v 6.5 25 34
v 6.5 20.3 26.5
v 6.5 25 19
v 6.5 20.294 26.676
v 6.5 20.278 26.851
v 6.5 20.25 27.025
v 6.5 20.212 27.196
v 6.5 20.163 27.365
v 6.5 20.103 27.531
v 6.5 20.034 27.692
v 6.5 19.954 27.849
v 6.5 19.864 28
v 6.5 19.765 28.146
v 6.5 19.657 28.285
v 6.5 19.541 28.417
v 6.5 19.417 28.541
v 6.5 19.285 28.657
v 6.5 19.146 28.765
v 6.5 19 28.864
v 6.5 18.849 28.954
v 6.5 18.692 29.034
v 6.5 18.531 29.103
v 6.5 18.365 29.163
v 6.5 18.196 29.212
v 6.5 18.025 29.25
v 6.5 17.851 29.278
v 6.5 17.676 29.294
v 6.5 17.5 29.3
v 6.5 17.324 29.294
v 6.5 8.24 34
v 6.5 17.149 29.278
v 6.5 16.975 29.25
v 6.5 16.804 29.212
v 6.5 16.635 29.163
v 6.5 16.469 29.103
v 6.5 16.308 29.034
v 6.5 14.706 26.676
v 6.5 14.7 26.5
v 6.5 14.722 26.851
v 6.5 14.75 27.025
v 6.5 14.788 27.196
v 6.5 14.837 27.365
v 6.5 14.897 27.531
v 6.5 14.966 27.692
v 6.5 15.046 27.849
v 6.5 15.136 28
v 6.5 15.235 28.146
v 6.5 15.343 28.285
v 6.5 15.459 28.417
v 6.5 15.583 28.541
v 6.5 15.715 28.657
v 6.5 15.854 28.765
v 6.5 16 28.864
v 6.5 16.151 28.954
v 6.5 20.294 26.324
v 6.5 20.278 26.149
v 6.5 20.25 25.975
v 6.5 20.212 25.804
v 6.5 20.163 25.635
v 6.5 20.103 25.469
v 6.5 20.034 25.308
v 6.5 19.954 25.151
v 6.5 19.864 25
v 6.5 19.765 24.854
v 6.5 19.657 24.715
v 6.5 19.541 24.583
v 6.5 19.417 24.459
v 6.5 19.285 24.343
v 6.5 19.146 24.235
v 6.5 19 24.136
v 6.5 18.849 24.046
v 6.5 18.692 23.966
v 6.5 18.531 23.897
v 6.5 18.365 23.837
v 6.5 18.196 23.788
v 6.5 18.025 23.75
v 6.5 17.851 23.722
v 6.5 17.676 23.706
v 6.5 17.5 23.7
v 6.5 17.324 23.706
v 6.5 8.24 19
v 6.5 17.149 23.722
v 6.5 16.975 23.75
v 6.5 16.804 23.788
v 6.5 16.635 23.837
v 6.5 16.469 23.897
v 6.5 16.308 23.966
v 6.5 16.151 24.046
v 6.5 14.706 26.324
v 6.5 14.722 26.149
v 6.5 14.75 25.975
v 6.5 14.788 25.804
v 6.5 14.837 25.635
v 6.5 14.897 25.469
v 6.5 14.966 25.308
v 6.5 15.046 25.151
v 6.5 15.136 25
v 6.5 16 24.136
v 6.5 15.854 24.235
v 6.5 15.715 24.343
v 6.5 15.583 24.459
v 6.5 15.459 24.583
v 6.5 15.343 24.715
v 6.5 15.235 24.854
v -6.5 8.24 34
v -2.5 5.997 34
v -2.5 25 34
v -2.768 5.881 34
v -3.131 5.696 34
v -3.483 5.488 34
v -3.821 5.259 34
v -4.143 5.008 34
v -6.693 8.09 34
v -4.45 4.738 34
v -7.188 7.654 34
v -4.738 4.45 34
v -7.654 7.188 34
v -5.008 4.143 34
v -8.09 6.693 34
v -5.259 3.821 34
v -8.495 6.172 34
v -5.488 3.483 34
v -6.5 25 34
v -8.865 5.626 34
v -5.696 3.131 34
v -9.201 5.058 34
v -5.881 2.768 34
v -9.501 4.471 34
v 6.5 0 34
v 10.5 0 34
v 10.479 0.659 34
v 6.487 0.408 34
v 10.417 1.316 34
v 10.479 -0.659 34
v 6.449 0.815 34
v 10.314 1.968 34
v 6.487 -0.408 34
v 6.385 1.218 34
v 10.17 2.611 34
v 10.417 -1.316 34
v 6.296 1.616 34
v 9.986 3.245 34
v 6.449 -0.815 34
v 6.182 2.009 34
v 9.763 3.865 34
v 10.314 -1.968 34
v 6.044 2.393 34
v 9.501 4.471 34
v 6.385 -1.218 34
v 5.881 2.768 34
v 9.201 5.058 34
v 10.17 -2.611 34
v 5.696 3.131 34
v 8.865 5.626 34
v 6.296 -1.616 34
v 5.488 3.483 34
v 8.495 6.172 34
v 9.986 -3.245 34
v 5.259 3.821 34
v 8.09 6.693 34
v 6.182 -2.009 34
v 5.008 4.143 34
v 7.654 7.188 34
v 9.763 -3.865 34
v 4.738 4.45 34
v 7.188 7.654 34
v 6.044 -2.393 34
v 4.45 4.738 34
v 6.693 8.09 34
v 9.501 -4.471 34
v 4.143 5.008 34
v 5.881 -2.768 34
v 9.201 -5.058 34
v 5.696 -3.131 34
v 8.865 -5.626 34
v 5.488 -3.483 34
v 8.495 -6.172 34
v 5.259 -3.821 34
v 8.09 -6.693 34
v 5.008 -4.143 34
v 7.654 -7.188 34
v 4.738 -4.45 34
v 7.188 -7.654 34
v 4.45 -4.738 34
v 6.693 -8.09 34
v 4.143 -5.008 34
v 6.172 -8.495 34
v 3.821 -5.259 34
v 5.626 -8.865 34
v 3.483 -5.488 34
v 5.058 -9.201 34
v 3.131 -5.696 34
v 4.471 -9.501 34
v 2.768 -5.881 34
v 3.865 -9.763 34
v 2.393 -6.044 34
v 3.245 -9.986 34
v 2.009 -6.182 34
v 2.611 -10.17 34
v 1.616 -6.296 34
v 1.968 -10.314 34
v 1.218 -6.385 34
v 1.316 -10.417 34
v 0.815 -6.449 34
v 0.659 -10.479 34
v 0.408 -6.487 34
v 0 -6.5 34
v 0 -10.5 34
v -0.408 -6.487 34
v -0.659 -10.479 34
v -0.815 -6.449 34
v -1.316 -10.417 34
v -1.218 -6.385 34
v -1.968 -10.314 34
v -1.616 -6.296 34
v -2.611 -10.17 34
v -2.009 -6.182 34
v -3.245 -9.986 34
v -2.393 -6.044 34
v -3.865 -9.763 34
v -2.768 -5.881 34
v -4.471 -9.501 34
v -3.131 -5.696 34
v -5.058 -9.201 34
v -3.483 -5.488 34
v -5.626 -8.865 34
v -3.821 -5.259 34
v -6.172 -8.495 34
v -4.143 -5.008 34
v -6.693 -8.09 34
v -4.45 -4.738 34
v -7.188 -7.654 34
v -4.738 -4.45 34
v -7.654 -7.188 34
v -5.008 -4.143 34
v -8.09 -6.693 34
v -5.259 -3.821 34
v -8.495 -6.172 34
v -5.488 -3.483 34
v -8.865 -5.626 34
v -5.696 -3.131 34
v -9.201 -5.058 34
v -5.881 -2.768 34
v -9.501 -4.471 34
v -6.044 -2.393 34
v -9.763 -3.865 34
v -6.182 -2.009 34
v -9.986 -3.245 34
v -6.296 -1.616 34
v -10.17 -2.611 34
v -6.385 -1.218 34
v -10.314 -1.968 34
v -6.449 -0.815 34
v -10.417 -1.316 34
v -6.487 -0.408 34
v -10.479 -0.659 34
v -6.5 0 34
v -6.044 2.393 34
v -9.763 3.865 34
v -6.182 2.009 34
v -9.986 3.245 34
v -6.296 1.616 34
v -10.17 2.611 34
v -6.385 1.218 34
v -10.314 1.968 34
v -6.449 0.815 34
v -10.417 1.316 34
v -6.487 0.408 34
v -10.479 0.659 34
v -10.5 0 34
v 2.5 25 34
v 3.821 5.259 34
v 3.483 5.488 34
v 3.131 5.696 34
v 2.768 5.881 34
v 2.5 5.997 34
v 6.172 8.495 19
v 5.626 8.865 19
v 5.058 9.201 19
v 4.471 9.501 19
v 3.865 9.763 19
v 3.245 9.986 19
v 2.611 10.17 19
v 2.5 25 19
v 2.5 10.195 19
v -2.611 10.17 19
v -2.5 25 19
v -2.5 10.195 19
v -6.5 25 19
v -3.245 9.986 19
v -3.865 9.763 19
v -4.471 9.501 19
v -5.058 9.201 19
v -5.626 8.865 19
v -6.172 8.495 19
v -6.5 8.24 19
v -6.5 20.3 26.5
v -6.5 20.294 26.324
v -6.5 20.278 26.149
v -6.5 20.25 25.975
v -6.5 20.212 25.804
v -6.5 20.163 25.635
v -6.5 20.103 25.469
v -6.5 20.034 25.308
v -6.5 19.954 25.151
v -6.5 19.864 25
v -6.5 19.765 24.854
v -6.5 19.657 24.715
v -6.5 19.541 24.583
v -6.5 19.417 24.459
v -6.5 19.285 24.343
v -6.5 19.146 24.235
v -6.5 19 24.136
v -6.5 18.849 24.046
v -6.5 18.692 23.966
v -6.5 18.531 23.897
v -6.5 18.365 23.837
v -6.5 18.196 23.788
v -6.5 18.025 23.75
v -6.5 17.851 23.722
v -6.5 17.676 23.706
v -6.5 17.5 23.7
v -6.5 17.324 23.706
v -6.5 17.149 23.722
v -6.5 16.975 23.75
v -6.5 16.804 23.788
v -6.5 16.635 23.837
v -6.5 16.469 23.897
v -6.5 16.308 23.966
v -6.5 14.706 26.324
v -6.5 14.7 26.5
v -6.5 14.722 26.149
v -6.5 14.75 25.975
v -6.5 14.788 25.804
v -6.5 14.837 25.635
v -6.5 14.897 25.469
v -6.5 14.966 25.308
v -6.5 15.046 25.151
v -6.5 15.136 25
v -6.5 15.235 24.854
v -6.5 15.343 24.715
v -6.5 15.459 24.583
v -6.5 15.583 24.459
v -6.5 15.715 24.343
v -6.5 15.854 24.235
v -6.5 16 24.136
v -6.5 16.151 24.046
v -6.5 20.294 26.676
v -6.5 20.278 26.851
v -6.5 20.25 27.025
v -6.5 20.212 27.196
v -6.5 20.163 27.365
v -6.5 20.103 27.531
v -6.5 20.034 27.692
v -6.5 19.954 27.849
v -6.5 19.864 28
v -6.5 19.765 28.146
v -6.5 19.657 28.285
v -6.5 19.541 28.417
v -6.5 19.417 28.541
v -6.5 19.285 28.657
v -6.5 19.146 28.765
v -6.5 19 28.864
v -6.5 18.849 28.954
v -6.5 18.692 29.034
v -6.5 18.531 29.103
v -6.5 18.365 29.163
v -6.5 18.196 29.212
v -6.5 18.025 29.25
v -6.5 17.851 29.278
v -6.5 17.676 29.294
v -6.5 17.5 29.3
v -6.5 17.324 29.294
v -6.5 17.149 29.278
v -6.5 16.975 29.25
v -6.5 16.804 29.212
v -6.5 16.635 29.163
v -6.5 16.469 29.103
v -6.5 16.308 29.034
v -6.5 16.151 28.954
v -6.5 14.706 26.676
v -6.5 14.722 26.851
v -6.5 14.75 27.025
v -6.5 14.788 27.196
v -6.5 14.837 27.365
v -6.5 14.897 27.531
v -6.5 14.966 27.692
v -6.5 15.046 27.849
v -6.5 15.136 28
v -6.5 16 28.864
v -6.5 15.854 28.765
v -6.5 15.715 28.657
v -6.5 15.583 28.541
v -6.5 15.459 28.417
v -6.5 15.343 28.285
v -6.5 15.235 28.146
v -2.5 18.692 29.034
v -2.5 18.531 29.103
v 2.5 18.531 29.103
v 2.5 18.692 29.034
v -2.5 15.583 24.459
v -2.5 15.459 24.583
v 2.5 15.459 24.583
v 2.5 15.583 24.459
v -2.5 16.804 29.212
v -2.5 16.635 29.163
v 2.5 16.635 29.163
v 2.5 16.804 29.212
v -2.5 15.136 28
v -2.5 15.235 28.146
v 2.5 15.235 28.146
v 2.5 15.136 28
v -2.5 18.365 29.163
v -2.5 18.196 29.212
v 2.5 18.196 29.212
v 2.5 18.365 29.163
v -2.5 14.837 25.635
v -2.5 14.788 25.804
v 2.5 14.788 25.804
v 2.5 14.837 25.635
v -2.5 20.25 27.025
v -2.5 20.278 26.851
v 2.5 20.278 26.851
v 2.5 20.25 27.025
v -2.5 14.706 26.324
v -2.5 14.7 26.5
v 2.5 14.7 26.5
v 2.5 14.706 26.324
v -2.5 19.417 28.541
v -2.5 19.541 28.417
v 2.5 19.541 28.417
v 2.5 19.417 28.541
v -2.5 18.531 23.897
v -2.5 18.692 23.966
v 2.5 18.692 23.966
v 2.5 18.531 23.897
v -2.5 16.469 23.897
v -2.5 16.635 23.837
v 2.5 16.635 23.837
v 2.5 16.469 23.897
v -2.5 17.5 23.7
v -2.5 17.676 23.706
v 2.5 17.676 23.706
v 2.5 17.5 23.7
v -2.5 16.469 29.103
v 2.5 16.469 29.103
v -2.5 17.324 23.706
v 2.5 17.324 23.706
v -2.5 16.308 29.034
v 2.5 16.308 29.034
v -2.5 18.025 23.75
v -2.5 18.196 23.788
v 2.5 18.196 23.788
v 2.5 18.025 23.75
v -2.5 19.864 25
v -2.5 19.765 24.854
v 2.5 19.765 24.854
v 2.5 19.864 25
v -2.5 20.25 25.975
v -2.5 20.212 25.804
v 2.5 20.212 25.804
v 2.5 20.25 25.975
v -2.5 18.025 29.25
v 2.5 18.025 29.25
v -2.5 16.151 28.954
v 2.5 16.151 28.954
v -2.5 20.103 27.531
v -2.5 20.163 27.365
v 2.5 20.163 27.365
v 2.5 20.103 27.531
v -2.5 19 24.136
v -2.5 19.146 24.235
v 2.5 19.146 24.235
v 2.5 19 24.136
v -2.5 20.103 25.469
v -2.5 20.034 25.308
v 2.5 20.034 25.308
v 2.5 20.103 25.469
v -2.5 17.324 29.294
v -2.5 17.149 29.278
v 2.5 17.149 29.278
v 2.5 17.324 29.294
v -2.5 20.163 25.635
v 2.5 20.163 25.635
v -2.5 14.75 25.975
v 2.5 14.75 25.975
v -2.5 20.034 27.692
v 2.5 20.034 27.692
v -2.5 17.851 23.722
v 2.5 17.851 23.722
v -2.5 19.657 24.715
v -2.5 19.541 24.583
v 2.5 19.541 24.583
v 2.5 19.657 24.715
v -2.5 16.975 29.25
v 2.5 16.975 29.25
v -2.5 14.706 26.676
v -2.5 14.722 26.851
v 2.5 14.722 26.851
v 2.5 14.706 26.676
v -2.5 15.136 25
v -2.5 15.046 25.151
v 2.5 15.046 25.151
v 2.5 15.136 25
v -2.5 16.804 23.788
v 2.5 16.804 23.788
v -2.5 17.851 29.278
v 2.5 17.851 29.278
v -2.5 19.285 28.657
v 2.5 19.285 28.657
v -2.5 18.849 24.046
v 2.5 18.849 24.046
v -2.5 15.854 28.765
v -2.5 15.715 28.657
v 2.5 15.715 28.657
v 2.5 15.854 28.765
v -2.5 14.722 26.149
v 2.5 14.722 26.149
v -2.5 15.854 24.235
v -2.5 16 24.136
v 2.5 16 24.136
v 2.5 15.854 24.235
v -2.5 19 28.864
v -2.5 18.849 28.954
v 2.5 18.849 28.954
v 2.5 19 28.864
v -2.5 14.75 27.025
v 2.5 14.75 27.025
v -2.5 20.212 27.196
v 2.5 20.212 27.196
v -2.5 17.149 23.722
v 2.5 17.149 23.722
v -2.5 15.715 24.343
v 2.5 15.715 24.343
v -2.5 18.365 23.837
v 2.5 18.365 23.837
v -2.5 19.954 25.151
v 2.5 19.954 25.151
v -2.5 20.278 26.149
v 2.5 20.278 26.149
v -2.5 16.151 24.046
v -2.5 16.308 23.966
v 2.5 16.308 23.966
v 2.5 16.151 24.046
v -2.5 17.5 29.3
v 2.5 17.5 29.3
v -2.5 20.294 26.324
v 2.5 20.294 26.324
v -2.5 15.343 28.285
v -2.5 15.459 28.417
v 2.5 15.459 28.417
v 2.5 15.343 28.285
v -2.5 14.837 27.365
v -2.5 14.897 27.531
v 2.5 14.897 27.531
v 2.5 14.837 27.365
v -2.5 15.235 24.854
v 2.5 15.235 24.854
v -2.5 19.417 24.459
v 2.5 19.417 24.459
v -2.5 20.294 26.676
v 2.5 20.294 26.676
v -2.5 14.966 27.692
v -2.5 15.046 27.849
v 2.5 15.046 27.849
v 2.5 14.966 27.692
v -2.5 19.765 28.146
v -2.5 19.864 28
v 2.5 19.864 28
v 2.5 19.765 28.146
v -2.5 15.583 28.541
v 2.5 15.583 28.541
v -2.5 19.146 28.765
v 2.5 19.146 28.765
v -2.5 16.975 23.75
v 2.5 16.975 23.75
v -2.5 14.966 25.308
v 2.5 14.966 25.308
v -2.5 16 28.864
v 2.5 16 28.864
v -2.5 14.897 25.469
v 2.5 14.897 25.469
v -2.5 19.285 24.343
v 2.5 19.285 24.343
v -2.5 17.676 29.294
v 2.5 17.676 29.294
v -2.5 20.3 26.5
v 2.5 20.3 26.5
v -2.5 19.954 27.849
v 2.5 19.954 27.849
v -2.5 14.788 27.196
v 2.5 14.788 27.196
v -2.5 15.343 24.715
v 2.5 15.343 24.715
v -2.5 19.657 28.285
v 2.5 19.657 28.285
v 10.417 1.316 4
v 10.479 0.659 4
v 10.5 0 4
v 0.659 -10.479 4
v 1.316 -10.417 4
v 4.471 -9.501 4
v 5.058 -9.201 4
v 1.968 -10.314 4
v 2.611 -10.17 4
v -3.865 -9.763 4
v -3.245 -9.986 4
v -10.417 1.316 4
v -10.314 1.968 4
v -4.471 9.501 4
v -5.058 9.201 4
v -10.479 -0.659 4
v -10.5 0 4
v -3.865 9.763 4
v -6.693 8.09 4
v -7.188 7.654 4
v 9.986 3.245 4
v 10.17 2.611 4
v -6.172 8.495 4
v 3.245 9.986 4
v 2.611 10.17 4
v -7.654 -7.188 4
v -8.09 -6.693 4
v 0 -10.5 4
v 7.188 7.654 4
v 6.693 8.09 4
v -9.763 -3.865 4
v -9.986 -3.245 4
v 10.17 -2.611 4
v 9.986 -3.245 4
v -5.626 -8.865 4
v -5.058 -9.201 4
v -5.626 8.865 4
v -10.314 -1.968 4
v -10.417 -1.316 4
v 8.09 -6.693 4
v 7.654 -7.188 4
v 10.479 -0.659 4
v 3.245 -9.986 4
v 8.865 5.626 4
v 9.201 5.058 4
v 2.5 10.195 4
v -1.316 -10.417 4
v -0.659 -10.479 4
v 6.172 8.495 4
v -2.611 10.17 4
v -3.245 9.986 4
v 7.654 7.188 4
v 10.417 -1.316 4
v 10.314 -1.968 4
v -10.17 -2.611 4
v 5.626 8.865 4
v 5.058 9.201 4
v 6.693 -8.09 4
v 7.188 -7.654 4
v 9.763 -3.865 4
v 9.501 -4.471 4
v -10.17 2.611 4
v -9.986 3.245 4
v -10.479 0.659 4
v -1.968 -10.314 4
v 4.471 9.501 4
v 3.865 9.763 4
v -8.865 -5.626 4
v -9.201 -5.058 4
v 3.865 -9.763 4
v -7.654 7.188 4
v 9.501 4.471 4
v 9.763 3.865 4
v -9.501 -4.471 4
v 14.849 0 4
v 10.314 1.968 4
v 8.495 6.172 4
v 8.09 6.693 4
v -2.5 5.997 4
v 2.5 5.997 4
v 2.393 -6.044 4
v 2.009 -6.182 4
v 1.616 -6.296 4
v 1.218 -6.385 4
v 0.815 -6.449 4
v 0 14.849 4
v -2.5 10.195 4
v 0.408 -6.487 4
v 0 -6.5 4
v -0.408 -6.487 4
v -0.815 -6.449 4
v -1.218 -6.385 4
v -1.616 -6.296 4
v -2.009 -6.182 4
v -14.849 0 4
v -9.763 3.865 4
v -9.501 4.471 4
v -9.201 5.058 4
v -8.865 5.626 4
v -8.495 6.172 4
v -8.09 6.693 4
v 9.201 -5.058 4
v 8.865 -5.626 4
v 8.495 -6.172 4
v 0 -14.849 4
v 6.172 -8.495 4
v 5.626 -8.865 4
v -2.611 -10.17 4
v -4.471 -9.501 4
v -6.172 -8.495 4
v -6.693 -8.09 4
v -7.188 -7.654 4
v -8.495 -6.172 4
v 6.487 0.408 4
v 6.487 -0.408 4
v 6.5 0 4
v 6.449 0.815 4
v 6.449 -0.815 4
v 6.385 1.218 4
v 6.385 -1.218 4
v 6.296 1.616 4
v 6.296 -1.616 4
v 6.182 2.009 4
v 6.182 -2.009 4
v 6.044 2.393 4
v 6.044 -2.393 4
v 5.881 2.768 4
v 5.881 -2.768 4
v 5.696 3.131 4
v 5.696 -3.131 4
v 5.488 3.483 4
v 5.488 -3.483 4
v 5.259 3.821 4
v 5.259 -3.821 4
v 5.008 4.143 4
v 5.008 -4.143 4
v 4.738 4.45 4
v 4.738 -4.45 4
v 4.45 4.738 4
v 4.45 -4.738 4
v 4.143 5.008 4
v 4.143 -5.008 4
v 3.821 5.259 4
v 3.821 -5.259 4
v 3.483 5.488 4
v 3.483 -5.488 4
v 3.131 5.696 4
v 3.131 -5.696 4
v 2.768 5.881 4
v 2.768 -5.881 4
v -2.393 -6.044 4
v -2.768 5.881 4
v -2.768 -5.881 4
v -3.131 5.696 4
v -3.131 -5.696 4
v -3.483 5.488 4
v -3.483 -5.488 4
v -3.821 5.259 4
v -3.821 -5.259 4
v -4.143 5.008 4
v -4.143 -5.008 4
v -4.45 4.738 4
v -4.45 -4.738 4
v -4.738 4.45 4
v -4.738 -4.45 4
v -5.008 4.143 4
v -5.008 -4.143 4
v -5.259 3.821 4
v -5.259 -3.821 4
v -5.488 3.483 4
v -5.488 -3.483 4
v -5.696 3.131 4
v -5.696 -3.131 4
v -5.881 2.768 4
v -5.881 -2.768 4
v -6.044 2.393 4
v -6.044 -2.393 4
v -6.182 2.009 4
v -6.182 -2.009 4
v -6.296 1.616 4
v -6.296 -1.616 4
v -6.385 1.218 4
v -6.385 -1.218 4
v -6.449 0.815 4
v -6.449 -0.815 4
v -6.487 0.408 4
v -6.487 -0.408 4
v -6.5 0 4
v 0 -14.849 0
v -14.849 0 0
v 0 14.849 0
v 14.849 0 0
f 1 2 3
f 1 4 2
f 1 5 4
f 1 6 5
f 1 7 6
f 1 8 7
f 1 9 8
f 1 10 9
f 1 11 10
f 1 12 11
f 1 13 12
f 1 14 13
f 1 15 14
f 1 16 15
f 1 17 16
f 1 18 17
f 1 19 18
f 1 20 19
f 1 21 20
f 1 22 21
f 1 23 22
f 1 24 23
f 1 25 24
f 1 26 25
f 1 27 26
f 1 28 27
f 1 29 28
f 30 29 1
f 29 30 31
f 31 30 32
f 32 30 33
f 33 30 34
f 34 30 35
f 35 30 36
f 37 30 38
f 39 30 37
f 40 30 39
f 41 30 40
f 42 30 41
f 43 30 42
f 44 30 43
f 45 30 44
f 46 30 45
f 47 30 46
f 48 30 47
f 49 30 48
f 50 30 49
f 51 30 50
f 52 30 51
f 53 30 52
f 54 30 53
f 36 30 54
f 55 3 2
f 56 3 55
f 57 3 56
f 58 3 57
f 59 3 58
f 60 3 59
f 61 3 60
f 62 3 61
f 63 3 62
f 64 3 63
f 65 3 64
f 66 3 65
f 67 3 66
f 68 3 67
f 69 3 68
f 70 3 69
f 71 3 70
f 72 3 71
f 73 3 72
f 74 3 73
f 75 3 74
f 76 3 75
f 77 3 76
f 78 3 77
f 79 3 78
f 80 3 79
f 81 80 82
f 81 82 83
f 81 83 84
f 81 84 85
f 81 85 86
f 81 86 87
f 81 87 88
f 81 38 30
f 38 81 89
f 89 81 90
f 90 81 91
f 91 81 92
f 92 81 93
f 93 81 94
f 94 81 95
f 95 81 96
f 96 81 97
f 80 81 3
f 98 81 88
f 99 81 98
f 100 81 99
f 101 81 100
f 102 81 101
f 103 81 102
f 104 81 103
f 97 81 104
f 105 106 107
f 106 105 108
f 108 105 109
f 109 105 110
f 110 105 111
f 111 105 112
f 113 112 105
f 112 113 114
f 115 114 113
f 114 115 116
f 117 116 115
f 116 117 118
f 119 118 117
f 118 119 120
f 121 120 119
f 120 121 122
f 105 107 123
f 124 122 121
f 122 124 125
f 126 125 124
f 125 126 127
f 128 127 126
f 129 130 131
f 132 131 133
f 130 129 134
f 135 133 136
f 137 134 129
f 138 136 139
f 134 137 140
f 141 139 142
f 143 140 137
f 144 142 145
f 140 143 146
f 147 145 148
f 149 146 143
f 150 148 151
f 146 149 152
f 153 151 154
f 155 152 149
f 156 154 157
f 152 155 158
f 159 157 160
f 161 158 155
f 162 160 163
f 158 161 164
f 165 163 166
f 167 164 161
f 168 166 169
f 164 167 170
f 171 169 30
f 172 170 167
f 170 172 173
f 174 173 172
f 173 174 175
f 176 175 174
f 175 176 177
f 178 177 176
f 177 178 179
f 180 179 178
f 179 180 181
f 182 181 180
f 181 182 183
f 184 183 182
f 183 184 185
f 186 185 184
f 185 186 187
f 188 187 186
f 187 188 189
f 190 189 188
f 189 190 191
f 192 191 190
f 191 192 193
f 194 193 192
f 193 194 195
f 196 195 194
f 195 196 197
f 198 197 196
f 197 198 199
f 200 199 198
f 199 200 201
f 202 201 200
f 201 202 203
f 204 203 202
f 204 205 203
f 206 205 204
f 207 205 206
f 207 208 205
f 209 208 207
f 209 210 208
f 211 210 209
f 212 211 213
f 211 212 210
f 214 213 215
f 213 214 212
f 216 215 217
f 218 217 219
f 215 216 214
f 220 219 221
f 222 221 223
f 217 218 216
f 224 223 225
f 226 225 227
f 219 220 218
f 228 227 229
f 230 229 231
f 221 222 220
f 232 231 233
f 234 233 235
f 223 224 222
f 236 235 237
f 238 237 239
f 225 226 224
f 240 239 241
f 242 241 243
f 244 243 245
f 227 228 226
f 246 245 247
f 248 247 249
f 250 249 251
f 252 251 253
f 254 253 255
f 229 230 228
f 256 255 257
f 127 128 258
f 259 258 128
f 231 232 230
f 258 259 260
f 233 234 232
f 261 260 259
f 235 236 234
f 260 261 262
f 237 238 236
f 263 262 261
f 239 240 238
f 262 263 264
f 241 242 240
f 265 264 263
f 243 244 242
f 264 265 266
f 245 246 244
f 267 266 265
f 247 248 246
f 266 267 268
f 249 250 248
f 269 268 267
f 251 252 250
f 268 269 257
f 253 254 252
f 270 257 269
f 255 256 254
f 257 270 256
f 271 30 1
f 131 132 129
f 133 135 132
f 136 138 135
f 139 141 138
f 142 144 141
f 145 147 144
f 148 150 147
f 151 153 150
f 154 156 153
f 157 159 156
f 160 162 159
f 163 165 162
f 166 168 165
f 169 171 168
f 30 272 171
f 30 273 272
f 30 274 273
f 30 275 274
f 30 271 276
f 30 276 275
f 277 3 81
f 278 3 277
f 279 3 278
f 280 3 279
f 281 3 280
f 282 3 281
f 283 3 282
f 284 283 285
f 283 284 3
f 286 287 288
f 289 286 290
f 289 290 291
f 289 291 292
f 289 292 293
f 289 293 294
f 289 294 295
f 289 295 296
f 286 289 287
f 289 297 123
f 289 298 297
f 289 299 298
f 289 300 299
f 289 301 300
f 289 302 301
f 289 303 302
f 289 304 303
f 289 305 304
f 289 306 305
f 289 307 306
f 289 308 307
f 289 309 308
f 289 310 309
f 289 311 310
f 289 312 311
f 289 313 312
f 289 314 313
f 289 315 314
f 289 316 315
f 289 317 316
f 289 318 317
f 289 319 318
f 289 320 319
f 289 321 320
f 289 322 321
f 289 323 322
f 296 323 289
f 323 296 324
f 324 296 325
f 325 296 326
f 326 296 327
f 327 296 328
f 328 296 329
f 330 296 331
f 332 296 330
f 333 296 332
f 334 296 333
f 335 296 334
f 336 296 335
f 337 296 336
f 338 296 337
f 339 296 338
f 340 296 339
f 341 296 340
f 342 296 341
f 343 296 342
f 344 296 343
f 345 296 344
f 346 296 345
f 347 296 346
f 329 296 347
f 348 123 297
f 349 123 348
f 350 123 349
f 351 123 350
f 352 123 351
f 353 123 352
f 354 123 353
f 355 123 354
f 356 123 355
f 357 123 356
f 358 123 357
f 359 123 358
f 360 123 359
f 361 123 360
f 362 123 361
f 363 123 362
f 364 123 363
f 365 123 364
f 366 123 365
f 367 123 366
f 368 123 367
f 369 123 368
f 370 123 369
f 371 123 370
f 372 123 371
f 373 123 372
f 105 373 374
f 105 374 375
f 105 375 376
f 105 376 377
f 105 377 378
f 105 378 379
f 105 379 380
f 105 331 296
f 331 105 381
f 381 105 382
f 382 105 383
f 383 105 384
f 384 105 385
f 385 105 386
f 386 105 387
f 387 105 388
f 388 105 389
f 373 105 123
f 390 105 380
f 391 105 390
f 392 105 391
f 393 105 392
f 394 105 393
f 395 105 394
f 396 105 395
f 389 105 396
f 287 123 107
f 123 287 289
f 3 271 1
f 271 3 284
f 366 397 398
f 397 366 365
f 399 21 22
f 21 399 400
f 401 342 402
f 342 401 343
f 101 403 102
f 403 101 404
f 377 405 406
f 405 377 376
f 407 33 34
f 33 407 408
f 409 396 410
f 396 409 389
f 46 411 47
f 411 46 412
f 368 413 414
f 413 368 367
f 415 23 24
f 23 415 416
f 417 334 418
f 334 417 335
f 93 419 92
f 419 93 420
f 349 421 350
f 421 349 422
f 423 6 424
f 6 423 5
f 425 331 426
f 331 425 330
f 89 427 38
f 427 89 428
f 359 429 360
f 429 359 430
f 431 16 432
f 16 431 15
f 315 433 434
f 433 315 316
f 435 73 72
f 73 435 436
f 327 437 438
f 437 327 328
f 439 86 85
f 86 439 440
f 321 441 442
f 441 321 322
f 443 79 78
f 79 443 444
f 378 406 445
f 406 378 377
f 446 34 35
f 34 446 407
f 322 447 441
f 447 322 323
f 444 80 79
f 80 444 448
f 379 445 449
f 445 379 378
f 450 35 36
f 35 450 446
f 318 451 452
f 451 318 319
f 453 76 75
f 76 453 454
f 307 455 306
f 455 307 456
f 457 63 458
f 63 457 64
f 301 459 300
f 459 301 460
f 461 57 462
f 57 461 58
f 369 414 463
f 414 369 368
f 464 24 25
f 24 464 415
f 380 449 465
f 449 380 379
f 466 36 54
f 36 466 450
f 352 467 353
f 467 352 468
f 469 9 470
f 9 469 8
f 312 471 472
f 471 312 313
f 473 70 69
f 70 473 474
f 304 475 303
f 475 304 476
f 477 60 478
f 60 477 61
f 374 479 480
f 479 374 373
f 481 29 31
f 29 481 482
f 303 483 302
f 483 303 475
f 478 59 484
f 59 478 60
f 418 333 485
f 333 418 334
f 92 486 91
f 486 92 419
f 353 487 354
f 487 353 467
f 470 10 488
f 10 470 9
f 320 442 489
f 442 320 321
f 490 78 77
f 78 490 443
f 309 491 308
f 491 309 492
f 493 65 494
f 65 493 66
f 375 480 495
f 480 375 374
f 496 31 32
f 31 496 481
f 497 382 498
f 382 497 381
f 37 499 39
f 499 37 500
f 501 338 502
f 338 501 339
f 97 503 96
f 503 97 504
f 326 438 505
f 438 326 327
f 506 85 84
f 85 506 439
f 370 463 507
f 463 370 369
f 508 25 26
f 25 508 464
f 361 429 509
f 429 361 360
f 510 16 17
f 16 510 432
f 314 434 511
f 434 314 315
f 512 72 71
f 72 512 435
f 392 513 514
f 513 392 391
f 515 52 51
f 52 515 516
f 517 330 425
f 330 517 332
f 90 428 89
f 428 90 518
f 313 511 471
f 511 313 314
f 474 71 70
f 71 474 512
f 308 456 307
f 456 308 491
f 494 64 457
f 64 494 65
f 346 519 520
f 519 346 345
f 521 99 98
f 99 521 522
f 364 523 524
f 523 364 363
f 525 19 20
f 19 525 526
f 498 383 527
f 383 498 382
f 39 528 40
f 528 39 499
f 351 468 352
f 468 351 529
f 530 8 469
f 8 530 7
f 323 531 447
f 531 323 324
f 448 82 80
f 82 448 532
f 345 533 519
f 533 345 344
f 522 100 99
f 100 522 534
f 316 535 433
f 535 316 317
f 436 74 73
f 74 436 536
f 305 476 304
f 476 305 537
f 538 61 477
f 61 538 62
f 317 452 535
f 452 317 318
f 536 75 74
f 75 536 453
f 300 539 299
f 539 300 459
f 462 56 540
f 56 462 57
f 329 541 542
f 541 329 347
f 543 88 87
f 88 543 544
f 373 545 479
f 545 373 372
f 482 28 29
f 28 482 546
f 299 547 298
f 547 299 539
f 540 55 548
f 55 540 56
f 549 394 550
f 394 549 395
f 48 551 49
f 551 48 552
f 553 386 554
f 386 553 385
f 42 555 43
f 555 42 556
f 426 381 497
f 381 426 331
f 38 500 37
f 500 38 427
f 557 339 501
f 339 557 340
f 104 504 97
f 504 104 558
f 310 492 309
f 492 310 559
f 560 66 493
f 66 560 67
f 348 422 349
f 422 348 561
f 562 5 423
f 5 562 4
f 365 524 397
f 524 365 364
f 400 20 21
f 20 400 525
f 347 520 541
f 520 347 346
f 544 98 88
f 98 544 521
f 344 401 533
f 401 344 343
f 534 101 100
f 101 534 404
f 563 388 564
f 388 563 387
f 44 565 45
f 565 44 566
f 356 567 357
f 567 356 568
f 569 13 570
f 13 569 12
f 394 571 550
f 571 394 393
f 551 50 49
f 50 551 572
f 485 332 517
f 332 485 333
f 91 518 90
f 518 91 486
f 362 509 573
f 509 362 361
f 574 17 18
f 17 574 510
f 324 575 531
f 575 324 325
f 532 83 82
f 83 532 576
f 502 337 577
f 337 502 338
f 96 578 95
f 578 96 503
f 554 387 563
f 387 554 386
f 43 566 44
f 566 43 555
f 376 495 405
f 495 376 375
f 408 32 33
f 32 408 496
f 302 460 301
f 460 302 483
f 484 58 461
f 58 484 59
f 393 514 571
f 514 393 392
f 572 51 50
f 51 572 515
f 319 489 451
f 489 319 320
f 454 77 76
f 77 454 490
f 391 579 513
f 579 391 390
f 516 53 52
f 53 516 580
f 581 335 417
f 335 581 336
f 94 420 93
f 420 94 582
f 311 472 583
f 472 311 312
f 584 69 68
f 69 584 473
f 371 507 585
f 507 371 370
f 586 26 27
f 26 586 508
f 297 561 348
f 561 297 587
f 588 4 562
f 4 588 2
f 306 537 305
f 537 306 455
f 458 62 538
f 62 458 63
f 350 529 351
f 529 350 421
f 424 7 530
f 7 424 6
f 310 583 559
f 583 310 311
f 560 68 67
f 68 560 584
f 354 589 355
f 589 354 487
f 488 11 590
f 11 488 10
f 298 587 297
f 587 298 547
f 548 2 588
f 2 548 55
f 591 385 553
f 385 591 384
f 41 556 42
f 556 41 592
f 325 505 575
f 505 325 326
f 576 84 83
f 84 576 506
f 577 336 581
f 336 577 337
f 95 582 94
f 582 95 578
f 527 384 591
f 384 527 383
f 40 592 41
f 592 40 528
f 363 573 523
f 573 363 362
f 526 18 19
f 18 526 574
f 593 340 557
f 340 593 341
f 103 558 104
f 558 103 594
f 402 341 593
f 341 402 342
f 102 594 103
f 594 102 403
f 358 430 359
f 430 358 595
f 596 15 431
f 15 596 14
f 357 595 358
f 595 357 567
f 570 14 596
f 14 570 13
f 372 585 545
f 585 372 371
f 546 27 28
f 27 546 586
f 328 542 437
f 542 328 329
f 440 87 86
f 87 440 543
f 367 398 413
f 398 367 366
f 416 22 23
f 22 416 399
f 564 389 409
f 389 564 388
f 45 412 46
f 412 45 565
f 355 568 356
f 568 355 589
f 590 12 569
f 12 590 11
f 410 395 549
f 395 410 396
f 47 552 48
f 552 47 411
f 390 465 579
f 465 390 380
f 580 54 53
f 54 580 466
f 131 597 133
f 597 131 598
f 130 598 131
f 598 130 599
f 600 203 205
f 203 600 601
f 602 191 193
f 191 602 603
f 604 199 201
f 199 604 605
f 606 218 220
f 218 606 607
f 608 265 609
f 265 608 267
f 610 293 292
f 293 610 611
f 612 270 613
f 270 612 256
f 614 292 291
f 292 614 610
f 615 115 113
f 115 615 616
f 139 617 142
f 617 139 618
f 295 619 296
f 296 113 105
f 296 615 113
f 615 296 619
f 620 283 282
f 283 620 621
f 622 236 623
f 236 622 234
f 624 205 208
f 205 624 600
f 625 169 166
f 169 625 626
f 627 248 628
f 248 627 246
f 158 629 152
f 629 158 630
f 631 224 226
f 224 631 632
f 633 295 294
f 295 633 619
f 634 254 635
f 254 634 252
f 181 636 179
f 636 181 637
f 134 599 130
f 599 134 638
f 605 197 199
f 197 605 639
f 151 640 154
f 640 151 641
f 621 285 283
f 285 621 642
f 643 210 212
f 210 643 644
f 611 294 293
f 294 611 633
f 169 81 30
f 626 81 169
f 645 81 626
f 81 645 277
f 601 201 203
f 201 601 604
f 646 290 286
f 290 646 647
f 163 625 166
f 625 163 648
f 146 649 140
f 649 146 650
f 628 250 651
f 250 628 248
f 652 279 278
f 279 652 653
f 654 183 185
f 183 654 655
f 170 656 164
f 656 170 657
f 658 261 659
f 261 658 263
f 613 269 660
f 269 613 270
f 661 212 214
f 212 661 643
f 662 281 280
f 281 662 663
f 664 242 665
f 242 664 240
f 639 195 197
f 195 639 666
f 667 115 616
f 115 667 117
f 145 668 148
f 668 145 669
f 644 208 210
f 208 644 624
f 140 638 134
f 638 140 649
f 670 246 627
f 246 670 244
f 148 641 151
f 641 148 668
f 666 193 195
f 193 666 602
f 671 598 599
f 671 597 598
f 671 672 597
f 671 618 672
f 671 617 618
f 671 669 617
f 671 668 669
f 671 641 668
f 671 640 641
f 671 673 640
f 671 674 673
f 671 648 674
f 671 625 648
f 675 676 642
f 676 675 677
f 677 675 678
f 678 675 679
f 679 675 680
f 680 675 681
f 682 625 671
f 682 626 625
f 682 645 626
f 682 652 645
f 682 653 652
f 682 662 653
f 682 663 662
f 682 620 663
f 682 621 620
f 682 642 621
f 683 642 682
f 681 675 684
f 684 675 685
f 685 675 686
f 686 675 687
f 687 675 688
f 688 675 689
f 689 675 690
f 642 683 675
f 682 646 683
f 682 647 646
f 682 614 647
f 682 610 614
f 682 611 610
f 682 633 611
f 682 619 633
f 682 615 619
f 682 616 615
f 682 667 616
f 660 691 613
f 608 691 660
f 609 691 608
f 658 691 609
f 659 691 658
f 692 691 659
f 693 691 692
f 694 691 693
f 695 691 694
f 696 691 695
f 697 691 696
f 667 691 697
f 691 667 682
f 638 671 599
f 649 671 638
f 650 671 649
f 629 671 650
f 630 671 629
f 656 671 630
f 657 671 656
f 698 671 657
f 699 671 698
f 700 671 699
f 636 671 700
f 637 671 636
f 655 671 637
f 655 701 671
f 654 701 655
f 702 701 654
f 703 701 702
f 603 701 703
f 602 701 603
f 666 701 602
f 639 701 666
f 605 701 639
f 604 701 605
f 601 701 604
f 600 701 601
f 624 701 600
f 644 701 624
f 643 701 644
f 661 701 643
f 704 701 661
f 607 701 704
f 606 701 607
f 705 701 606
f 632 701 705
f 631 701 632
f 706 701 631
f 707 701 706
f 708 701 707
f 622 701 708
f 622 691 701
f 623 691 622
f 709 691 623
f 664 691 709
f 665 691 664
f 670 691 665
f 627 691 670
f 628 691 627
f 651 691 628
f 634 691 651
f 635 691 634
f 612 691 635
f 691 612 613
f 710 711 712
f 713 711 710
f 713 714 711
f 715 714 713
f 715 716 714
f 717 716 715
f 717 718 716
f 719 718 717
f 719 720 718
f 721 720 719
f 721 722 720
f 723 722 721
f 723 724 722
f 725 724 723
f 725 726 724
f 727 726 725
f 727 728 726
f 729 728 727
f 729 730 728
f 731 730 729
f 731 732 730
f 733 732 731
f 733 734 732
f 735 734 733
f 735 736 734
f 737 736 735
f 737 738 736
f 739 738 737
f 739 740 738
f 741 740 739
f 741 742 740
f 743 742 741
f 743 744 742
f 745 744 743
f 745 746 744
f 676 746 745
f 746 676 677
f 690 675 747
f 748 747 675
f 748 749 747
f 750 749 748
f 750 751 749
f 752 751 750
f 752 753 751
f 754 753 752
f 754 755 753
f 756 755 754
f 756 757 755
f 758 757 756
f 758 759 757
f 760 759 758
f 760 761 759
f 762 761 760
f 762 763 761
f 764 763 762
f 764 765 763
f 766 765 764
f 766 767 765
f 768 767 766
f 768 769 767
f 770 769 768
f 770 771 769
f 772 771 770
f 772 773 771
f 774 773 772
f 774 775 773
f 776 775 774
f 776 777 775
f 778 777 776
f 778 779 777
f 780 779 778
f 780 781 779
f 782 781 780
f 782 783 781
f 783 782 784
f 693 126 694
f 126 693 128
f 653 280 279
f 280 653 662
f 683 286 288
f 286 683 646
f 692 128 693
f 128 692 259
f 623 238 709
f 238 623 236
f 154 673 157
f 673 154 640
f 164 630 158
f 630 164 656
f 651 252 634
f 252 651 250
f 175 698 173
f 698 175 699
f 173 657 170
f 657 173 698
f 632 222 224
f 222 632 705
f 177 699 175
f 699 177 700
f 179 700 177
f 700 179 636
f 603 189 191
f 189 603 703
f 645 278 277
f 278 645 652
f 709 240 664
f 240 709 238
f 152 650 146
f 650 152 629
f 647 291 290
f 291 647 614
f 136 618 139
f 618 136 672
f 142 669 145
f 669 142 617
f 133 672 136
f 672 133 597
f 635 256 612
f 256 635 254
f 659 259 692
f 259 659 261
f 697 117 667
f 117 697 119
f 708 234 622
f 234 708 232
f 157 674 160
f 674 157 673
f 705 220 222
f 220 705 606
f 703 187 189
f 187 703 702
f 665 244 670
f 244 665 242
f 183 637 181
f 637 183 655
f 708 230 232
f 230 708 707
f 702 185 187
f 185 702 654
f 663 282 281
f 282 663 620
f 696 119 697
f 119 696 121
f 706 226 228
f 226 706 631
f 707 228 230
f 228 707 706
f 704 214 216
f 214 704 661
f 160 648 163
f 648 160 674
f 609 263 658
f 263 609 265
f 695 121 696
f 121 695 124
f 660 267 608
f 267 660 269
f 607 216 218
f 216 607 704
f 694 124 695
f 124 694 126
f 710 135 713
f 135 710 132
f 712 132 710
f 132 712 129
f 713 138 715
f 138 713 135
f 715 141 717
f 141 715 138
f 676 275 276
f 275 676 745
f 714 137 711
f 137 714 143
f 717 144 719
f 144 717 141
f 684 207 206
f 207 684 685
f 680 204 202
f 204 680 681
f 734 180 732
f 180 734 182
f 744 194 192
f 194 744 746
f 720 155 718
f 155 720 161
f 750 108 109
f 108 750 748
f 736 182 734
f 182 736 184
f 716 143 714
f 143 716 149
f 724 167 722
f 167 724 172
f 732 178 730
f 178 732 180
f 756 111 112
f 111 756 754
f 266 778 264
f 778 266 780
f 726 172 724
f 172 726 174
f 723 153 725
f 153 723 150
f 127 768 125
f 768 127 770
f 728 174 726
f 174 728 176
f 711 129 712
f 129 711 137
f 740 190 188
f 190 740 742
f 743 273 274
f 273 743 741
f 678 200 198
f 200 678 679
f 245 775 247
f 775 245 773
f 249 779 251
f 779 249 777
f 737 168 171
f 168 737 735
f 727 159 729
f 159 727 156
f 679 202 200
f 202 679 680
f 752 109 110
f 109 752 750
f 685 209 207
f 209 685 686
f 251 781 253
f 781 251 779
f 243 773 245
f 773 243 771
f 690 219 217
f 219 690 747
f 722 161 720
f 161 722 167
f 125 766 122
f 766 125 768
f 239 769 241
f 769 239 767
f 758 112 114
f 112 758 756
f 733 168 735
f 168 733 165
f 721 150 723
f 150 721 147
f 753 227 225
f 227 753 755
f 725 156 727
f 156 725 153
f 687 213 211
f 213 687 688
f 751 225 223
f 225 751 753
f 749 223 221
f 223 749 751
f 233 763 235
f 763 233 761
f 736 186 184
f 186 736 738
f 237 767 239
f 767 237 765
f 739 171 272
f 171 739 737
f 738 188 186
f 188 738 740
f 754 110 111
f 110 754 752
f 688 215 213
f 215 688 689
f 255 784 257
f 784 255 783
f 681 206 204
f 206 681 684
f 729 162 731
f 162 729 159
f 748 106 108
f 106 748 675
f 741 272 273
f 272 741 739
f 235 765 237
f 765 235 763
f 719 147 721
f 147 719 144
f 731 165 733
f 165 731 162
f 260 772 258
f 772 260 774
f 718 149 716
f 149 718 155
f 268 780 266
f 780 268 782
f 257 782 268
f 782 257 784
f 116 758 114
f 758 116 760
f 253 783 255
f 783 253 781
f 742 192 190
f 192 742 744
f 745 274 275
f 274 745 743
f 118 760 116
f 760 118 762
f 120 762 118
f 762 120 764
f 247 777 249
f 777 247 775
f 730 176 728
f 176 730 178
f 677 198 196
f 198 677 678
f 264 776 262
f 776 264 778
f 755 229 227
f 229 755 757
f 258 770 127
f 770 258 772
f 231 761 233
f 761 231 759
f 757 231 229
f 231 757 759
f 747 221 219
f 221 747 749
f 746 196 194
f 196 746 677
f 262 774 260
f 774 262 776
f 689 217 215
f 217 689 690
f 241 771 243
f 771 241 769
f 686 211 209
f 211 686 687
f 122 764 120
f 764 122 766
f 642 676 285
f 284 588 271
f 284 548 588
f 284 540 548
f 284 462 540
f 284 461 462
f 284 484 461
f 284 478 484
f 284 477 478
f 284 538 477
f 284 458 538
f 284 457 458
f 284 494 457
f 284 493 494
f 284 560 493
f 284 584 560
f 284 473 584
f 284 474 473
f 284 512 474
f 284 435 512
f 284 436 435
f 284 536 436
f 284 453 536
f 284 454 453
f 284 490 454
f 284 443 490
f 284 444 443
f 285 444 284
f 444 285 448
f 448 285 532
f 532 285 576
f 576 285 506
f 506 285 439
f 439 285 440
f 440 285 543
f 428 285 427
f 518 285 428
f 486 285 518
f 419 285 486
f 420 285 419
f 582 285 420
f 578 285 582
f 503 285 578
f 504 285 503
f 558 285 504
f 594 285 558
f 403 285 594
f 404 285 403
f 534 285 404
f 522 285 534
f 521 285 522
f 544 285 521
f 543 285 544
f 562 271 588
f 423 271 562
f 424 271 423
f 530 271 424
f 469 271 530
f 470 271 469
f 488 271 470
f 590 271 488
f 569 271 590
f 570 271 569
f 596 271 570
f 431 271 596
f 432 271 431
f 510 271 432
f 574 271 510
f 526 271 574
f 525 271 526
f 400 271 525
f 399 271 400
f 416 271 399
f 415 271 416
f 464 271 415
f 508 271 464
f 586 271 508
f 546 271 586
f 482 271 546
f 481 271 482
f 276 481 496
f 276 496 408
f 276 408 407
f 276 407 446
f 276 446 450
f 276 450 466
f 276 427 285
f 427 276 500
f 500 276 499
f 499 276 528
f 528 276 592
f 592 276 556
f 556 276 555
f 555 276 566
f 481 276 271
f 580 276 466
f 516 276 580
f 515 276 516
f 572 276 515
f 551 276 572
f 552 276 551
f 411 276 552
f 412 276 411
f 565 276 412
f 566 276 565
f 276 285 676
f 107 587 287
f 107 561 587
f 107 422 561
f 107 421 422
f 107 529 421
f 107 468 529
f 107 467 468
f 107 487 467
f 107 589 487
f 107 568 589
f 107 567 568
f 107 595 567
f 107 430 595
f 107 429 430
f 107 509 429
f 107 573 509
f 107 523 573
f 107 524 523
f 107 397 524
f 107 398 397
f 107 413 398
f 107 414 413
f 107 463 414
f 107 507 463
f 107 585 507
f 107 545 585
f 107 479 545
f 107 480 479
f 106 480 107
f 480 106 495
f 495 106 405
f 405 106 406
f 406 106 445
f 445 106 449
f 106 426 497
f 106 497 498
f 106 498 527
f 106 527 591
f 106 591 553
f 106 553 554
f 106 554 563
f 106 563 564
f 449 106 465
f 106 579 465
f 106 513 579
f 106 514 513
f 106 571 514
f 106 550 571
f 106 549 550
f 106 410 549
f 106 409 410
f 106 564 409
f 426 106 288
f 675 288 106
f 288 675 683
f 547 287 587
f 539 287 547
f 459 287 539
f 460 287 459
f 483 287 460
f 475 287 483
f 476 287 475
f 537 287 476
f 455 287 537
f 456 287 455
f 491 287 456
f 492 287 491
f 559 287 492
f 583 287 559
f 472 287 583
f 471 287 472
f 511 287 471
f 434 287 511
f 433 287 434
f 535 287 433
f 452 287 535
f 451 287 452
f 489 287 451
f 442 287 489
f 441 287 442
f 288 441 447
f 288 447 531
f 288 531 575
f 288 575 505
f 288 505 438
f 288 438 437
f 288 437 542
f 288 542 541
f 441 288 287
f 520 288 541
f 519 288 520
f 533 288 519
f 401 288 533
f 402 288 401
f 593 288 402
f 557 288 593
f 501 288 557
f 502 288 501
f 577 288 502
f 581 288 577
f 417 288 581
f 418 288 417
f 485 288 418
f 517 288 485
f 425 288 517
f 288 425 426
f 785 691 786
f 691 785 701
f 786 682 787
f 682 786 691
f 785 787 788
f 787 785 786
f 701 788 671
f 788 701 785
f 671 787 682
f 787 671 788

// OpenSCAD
cube_size = 30;
rod_diameter = 13;
tab_width = 4; 
gap_width = 5;
rod_height = 30;
wall_width = 4;

module rod_holder(){
    translate([0,0,wall_width])
    difference(){
    union(){
        difference(){
        translate([-tab_width - gap_width/2, 0, 15])
        cube([2 * tab_width + gap_width, 25, 15]);
            
        translate([-50, 25/2 + 5,15 + 15/2])
        rotate([0, 90, 0])
        cylinder(r=2.8, h = 100, $fn=100);
            
        }
        cylinder(r=rod_diameter/2 + wall_width, h=30, $fn=100);
    }
    cylinder(r=rod_diameter/2, h=31, $fn=100);
    translate([-2.5, 0, 0])
    cube([5, 30, rod_height]);
    }


        
}
rotate([0,0,45])
translate([-(rod_diameter/2 + wall_width), -(rod_diameter/2 + wall_width), 0])
    cube([rod_diameter + 2 * wall_width, ,rod_diameter + 2 * wall_width,4]);
rod_holder();
